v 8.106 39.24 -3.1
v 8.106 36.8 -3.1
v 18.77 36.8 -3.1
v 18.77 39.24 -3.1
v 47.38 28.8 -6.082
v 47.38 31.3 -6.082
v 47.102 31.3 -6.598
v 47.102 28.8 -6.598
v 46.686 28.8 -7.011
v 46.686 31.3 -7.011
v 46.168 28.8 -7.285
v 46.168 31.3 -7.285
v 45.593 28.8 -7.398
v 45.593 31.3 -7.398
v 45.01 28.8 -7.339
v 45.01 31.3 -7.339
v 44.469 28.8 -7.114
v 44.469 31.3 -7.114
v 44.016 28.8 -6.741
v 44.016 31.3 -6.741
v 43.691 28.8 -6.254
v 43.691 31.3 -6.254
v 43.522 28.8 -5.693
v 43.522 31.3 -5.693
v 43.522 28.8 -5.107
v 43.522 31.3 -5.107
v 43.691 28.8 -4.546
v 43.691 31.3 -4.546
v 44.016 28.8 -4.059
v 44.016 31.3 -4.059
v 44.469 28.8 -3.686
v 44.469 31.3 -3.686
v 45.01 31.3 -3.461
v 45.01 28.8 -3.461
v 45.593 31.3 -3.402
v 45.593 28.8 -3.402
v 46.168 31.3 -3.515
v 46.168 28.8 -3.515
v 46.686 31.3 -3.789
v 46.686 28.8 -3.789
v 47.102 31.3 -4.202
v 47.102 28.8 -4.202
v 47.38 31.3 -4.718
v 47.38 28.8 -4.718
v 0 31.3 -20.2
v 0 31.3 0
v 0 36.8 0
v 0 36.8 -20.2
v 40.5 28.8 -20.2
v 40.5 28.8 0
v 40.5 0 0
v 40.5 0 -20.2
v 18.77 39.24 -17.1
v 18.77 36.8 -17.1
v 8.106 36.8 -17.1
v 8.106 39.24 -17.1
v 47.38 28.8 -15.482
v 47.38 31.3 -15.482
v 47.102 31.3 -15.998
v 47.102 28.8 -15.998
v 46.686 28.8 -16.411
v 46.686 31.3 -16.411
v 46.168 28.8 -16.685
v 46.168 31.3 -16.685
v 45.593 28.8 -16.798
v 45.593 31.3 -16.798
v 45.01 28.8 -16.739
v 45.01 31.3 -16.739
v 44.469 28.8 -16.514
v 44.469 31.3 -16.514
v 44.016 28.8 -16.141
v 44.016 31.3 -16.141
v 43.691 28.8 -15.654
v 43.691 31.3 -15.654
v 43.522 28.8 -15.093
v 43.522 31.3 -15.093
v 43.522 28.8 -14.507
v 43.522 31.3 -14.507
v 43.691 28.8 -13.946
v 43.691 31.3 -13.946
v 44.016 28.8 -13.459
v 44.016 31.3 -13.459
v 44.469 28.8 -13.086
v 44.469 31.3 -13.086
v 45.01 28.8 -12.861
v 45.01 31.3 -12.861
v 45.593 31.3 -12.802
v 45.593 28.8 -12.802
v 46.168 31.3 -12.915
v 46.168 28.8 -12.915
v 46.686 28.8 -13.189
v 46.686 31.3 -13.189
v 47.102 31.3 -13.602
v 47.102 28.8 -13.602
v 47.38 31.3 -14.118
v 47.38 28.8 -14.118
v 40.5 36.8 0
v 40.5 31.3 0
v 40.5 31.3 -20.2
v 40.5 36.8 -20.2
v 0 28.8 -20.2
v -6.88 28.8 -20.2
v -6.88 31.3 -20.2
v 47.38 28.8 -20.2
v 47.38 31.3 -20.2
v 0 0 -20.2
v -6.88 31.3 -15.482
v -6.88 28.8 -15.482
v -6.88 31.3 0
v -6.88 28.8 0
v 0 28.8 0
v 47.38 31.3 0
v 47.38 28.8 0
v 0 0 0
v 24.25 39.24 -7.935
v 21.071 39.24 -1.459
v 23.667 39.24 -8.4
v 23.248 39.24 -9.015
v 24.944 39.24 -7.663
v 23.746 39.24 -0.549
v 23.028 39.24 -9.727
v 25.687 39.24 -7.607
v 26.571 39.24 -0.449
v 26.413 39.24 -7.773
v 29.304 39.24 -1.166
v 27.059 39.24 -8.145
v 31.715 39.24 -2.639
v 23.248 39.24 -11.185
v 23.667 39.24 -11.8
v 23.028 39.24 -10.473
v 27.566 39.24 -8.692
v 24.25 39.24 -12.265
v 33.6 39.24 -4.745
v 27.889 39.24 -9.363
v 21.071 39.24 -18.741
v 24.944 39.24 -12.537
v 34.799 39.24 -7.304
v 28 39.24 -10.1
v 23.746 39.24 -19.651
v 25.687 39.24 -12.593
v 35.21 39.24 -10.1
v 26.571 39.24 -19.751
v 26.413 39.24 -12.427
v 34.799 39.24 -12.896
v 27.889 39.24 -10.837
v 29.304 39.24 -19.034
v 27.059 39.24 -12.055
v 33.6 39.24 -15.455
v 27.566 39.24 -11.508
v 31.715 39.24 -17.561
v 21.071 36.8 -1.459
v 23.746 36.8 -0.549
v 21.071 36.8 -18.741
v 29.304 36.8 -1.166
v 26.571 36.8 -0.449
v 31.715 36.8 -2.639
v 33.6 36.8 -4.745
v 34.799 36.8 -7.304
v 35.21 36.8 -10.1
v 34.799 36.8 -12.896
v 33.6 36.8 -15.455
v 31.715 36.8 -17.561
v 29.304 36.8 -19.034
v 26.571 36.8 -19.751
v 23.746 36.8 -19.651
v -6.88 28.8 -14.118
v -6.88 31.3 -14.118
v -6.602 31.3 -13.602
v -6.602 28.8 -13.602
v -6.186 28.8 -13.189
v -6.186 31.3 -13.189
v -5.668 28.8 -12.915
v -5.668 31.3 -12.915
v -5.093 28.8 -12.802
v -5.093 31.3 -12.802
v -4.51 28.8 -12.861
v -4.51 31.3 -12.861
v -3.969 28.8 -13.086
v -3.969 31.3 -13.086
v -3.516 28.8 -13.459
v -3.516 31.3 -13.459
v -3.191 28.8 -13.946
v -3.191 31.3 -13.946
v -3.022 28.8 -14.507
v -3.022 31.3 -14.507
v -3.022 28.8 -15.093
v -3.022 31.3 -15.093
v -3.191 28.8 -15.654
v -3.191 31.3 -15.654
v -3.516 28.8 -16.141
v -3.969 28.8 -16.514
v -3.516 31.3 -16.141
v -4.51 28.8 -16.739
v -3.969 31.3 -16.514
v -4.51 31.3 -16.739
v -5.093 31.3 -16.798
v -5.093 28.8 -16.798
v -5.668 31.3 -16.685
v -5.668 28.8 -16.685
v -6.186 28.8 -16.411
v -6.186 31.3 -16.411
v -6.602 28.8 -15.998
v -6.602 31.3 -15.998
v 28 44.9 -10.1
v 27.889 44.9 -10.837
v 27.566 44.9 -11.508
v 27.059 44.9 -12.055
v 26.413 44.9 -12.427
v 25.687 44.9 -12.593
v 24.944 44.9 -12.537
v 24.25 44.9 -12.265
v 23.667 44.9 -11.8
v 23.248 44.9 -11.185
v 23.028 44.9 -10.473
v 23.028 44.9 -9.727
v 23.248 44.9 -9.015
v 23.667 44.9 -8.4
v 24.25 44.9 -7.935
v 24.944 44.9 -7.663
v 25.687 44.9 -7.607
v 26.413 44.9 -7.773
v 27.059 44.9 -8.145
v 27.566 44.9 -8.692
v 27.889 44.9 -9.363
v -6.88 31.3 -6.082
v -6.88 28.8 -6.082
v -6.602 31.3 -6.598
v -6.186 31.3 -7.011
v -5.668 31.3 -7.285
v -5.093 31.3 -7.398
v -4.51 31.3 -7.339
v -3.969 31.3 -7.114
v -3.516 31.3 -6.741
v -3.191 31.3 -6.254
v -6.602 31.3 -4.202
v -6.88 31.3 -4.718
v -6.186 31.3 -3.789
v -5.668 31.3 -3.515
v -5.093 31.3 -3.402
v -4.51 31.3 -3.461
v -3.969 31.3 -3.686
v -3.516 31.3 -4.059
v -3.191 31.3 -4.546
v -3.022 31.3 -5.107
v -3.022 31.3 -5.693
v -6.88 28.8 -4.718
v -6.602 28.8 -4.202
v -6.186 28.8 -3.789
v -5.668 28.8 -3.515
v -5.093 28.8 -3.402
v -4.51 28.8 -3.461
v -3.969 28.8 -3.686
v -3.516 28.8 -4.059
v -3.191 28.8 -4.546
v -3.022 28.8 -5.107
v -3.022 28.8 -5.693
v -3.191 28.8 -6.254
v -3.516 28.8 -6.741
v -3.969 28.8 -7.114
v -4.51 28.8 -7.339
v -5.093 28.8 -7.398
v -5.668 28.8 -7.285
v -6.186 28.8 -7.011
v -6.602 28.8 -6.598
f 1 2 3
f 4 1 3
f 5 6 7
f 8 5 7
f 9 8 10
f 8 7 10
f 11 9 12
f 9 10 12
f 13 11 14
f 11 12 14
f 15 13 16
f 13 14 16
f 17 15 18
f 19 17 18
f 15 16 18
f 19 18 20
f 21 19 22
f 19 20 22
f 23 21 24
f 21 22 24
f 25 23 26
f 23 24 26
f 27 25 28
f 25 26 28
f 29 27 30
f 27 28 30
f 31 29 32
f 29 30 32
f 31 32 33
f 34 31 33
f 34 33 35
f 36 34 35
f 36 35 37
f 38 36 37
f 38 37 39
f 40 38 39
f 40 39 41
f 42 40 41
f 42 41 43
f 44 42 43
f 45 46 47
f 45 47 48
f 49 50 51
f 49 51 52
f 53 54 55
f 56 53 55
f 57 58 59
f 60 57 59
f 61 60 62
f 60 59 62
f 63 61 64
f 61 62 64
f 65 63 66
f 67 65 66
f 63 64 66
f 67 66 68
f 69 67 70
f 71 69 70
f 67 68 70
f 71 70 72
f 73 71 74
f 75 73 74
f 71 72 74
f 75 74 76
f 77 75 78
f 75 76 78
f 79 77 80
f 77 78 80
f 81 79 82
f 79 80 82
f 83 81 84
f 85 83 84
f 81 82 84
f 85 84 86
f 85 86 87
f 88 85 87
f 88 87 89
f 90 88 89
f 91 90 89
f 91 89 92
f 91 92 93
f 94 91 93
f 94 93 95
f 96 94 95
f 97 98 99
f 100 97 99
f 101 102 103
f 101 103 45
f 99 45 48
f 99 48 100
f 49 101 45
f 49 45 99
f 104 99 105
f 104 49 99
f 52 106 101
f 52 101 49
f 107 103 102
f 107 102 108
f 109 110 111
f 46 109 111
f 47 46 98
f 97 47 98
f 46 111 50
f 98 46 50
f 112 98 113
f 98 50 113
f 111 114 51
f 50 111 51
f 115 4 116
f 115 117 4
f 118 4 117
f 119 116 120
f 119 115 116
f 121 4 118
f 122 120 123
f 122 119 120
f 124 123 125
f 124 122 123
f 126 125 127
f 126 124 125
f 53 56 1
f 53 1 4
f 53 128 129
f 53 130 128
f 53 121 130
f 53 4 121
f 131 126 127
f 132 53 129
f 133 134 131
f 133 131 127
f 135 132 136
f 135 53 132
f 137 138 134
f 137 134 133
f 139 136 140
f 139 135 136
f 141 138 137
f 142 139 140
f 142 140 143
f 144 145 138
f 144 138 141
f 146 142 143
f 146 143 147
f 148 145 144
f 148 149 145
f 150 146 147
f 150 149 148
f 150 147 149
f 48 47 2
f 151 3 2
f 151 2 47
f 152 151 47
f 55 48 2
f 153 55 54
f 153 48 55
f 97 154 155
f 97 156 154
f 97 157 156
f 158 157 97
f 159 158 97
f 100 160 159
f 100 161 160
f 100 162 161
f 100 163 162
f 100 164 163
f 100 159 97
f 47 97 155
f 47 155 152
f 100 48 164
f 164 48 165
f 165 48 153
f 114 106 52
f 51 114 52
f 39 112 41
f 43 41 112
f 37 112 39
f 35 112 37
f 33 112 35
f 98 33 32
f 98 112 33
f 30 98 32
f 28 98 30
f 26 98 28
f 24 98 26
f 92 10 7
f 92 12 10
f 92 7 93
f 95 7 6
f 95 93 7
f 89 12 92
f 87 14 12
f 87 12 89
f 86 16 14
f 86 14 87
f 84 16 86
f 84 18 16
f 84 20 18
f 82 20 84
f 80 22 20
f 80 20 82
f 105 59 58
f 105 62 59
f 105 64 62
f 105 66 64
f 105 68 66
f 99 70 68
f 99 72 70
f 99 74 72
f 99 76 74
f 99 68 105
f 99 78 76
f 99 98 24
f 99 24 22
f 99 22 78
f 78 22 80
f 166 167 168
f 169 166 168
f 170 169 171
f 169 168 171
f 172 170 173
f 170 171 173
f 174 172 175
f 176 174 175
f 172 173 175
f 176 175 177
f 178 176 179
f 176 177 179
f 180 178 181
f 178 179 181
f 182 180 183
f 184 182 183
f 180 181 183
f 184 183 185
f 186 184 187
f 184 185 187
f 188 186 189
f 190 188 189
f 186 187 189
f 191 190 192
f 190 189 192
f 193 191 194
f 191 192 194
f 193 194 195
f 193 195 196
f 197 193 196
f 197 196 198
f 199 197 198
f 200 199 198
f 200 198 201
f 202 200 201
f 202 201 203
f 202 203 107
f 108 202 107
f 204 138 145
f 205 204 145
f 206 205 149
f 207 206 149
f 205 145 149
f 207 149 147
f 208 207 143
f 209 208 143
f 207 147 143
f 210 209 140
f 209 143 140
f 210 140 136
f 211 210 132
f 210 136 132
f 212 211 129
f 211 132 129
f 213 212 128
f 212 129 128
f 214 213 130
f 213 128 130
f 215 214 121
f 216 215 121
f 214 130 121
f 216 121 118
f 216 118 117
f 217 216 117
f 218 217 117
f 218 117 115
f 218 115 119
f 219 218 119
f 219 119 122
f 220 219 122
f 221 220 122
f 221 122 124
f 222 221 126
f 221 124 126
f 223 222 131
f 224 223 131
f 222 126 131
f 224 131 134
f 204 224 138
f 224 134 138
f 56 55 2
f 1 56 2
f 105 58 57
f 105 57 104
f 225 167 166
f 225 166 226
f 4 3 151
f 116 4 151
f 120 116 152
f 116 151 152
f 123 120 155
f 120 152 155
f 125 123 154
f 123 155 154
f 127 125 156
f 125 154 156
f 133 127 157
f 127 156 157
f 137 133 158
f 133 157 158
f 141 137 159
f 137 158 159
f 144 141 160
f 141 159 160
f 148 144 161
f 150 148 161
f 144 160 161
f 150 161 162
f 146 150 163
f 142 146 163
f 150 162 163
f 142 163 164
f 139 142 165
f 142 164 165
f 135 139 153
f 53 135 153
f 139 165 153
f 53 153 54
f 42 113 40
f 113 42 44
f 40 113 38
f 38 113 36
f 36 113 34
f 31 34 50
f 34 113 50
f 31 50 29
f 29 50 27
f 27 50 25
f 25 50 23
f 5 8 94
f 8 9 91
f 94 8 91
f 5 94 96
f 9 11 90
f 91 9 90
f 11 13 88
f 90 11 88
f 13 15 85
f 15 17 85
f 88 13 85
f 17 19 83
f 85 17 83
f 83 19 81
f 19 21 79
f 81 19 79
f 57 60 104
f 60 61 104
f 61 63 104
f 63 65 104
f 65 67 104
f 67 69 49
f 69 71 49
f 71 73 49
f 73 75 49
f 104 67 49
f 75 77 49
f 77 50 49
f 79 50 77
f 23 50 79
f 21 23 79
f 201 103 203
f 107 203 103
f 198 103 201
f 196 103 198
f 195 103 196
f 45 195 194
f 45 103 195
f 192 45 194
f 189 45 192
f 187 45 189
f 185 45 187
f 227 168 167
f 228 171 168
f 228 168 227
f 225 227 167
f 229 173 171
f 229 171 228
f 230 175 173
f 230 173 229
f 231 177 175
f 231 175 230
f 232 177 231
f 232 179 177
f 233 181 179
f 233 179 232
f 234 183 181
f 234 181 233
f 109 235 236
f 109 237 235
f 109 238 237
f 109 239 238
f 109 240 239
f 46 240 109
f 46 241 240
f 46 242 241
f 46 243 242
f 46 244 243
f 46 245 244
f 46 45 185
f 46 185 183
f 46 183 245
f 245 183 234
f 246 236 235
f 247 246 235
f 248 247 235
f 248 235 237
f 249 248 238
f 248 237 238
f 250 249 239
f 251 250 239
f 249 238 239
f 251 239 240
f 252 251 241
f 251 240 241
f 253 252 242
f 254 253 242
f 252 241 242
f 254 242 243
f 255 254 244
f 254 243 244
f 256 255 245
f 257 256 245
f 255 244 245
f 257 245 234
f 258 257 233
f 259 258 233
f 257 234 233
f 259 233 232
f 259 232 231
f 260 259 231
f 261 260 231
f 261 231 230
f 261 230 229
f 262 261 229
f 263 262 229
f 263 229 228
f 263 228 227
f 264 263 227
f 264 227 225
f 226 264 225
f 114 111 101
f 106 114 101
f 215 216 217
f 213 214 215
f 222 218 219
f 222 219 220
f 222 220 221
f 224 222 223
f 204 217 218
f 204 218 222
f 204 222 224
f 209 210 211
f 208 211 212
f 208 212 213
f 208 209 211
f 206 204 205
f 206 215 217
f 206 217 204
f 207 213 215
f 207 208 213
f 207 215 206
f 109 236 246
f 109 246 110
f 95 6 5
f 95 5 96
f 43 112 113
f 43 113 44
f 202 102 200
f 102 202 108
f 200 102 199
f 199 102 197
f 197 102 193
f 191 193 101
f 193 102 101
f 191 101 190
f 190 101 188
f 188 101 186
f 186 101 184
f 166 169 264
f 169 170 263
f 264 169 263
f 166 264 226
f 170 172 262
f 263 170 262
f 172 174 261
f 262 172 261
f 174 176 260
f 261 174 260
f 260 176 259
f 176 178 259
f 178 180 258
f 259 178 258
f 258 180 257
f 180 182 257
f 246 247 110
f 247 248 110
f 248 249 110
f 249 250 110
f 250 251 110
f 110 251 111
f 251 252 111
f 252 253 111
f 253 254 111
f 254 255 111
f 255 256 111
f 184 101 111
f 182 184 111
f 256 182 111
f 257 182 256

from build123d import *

# Parameters (mm, degrees)
CROQUIS1_W              = 40.5
CROQUIS1_H              = 20.2
SALIENTE_EXTRUIR1_DEPTH = 36.8
CROQUIS2_R              = 9.710333118
SALIENTE_EXTRUIR2_DEPTH = 2.44
CROQUIS3_R              = 2.5
SALIENTE_EXTRUIR3_DEPTH = 5.66
CROQUIS4_W              = 20.2
CROQUIS4_H              = 2.5
SALIENTE_EXTRUIR4_DEPTH = 6.88
CROQUIS5_W              = 20.2
CROQUIS5_H              = 2.5
SALIENTE_EXTRUIR5_DEPTH = 6.88
CORTAR_EXTRUIR1_DEPTH   = 32.3


with BuildPart() as part:
    # Croquis1 → Saliente-Extruir1 (new body)
    with BuildSketch(Plane(origin=(0, 0, 0), x_dir=(1, 0, 0), z_dir=(0, 1, 0))):
        with Locations((20.25, 10.1)):
            Rectangle(CROQUIS1_W, CROQUIS1_H)
    extrude(amount=SALIENTE_EXTRUIR1_DEPTH)

    # Croquis2 → Saliente-Extruir2 (add)
    with BuildSketch(Plane(origin=(0, 36.8, 0), x_dir=(1, 0, 0), z_dir=(0, 1, 0))):
        with Locations((25.5, 10.1)):
            Circle(CROQUIS2_R)
        with BuildLine():
            Line((18.770173162, 17.1), (8.106469176, 17.1))
            Line((8.106469176, 17.1), (8.106469176, 3.1))
            Line((8.106469176, 3.1), (18.770173162, 3.1))
            ThreePointArc((18.770173162, 3.1), (15.789666882, 10.1), (18.770173162, 17.1))
        make_face()
    extrude(amount=SALIENTE_EXTRUIR2_DEPTH)

    # Croquis3 → Saliente-Extruir3 (add)
    with BuildSketch(Plane(origin=(0, 39.24, 0), x_dir=(1, 0, 0), z_dir=(0, 1, 0))):
        with Locations((25.5, 10.1)):
            Circle(CROQUIS3_R)
    extrude(amount=SALIENTE_EXTRUIR3_DEPTH)

    # Croquis4 → Saliente-Extruir4 (add)
    with BuildSketch(Plane.ZY):
        with Locations((-10.1, 30.05)):
            Rectangle(CROQUIS4_W, CROQUIS4_H)
    extrude(amount=SALIENTE_EXTRUIR4_DEPTH)

    # Croquis5 → Saliente-Extruir5 (add)
    with BuildSketch(Plane(origin=(40.5, 0, 0), x_dir=(0, 0, -1), z_dir=(1, 0, 0))):
        with Locations((10.1, 30.05)):
            Rectangle(CROQUIS5_W, CROQUIS5_H)
    extrude(amount=SALIENTE_EXTRUIR5_DEPTH)

    # Croquis6 → Cortar-Extruir1 (cut, through all)
    with BuildSketch(Plane(origin=(0, 31.3, 0), x_dir=(1, 0, 0), z_dir=(0, 1, 0))):
        with BuildLine():
            ThreePointArc((-6.88, 4.717651116), (-3, 5.4), (-6.88, 6.082348884))
            Line((-6.88, 6.082348884), (-6.88, 4.717651116))
        make_face()
        with BuildLine():
            ThreePointArc((-6.88, 14.117651116), (-3, 14.8), (-6.88, 15.482348884))
            Line((-6.88, 15.482348884), (-6.88, 14.117651116))
        make_face()
        with BuildLine():
            Line((47.38, 14.117651116), (47.38, 15.482348884))
            ThreePointArc((47.38, 15.482348884), (43.5, 14.8), (47.38, 14.117651116))
        make_face()
        with BuildLine():
            Line((47.38, 4.717651116), (47.38, 6.082348884))
            ThreePointArc((47.38, 6.082348884), (43.5, 5.4), (47.38, 4.717651116))
        make_face()
    extrude(amount=-CORTAR_EXTRUIR1_DEPTH, mode=Mode.SUBTRACT)


solid = part.part
